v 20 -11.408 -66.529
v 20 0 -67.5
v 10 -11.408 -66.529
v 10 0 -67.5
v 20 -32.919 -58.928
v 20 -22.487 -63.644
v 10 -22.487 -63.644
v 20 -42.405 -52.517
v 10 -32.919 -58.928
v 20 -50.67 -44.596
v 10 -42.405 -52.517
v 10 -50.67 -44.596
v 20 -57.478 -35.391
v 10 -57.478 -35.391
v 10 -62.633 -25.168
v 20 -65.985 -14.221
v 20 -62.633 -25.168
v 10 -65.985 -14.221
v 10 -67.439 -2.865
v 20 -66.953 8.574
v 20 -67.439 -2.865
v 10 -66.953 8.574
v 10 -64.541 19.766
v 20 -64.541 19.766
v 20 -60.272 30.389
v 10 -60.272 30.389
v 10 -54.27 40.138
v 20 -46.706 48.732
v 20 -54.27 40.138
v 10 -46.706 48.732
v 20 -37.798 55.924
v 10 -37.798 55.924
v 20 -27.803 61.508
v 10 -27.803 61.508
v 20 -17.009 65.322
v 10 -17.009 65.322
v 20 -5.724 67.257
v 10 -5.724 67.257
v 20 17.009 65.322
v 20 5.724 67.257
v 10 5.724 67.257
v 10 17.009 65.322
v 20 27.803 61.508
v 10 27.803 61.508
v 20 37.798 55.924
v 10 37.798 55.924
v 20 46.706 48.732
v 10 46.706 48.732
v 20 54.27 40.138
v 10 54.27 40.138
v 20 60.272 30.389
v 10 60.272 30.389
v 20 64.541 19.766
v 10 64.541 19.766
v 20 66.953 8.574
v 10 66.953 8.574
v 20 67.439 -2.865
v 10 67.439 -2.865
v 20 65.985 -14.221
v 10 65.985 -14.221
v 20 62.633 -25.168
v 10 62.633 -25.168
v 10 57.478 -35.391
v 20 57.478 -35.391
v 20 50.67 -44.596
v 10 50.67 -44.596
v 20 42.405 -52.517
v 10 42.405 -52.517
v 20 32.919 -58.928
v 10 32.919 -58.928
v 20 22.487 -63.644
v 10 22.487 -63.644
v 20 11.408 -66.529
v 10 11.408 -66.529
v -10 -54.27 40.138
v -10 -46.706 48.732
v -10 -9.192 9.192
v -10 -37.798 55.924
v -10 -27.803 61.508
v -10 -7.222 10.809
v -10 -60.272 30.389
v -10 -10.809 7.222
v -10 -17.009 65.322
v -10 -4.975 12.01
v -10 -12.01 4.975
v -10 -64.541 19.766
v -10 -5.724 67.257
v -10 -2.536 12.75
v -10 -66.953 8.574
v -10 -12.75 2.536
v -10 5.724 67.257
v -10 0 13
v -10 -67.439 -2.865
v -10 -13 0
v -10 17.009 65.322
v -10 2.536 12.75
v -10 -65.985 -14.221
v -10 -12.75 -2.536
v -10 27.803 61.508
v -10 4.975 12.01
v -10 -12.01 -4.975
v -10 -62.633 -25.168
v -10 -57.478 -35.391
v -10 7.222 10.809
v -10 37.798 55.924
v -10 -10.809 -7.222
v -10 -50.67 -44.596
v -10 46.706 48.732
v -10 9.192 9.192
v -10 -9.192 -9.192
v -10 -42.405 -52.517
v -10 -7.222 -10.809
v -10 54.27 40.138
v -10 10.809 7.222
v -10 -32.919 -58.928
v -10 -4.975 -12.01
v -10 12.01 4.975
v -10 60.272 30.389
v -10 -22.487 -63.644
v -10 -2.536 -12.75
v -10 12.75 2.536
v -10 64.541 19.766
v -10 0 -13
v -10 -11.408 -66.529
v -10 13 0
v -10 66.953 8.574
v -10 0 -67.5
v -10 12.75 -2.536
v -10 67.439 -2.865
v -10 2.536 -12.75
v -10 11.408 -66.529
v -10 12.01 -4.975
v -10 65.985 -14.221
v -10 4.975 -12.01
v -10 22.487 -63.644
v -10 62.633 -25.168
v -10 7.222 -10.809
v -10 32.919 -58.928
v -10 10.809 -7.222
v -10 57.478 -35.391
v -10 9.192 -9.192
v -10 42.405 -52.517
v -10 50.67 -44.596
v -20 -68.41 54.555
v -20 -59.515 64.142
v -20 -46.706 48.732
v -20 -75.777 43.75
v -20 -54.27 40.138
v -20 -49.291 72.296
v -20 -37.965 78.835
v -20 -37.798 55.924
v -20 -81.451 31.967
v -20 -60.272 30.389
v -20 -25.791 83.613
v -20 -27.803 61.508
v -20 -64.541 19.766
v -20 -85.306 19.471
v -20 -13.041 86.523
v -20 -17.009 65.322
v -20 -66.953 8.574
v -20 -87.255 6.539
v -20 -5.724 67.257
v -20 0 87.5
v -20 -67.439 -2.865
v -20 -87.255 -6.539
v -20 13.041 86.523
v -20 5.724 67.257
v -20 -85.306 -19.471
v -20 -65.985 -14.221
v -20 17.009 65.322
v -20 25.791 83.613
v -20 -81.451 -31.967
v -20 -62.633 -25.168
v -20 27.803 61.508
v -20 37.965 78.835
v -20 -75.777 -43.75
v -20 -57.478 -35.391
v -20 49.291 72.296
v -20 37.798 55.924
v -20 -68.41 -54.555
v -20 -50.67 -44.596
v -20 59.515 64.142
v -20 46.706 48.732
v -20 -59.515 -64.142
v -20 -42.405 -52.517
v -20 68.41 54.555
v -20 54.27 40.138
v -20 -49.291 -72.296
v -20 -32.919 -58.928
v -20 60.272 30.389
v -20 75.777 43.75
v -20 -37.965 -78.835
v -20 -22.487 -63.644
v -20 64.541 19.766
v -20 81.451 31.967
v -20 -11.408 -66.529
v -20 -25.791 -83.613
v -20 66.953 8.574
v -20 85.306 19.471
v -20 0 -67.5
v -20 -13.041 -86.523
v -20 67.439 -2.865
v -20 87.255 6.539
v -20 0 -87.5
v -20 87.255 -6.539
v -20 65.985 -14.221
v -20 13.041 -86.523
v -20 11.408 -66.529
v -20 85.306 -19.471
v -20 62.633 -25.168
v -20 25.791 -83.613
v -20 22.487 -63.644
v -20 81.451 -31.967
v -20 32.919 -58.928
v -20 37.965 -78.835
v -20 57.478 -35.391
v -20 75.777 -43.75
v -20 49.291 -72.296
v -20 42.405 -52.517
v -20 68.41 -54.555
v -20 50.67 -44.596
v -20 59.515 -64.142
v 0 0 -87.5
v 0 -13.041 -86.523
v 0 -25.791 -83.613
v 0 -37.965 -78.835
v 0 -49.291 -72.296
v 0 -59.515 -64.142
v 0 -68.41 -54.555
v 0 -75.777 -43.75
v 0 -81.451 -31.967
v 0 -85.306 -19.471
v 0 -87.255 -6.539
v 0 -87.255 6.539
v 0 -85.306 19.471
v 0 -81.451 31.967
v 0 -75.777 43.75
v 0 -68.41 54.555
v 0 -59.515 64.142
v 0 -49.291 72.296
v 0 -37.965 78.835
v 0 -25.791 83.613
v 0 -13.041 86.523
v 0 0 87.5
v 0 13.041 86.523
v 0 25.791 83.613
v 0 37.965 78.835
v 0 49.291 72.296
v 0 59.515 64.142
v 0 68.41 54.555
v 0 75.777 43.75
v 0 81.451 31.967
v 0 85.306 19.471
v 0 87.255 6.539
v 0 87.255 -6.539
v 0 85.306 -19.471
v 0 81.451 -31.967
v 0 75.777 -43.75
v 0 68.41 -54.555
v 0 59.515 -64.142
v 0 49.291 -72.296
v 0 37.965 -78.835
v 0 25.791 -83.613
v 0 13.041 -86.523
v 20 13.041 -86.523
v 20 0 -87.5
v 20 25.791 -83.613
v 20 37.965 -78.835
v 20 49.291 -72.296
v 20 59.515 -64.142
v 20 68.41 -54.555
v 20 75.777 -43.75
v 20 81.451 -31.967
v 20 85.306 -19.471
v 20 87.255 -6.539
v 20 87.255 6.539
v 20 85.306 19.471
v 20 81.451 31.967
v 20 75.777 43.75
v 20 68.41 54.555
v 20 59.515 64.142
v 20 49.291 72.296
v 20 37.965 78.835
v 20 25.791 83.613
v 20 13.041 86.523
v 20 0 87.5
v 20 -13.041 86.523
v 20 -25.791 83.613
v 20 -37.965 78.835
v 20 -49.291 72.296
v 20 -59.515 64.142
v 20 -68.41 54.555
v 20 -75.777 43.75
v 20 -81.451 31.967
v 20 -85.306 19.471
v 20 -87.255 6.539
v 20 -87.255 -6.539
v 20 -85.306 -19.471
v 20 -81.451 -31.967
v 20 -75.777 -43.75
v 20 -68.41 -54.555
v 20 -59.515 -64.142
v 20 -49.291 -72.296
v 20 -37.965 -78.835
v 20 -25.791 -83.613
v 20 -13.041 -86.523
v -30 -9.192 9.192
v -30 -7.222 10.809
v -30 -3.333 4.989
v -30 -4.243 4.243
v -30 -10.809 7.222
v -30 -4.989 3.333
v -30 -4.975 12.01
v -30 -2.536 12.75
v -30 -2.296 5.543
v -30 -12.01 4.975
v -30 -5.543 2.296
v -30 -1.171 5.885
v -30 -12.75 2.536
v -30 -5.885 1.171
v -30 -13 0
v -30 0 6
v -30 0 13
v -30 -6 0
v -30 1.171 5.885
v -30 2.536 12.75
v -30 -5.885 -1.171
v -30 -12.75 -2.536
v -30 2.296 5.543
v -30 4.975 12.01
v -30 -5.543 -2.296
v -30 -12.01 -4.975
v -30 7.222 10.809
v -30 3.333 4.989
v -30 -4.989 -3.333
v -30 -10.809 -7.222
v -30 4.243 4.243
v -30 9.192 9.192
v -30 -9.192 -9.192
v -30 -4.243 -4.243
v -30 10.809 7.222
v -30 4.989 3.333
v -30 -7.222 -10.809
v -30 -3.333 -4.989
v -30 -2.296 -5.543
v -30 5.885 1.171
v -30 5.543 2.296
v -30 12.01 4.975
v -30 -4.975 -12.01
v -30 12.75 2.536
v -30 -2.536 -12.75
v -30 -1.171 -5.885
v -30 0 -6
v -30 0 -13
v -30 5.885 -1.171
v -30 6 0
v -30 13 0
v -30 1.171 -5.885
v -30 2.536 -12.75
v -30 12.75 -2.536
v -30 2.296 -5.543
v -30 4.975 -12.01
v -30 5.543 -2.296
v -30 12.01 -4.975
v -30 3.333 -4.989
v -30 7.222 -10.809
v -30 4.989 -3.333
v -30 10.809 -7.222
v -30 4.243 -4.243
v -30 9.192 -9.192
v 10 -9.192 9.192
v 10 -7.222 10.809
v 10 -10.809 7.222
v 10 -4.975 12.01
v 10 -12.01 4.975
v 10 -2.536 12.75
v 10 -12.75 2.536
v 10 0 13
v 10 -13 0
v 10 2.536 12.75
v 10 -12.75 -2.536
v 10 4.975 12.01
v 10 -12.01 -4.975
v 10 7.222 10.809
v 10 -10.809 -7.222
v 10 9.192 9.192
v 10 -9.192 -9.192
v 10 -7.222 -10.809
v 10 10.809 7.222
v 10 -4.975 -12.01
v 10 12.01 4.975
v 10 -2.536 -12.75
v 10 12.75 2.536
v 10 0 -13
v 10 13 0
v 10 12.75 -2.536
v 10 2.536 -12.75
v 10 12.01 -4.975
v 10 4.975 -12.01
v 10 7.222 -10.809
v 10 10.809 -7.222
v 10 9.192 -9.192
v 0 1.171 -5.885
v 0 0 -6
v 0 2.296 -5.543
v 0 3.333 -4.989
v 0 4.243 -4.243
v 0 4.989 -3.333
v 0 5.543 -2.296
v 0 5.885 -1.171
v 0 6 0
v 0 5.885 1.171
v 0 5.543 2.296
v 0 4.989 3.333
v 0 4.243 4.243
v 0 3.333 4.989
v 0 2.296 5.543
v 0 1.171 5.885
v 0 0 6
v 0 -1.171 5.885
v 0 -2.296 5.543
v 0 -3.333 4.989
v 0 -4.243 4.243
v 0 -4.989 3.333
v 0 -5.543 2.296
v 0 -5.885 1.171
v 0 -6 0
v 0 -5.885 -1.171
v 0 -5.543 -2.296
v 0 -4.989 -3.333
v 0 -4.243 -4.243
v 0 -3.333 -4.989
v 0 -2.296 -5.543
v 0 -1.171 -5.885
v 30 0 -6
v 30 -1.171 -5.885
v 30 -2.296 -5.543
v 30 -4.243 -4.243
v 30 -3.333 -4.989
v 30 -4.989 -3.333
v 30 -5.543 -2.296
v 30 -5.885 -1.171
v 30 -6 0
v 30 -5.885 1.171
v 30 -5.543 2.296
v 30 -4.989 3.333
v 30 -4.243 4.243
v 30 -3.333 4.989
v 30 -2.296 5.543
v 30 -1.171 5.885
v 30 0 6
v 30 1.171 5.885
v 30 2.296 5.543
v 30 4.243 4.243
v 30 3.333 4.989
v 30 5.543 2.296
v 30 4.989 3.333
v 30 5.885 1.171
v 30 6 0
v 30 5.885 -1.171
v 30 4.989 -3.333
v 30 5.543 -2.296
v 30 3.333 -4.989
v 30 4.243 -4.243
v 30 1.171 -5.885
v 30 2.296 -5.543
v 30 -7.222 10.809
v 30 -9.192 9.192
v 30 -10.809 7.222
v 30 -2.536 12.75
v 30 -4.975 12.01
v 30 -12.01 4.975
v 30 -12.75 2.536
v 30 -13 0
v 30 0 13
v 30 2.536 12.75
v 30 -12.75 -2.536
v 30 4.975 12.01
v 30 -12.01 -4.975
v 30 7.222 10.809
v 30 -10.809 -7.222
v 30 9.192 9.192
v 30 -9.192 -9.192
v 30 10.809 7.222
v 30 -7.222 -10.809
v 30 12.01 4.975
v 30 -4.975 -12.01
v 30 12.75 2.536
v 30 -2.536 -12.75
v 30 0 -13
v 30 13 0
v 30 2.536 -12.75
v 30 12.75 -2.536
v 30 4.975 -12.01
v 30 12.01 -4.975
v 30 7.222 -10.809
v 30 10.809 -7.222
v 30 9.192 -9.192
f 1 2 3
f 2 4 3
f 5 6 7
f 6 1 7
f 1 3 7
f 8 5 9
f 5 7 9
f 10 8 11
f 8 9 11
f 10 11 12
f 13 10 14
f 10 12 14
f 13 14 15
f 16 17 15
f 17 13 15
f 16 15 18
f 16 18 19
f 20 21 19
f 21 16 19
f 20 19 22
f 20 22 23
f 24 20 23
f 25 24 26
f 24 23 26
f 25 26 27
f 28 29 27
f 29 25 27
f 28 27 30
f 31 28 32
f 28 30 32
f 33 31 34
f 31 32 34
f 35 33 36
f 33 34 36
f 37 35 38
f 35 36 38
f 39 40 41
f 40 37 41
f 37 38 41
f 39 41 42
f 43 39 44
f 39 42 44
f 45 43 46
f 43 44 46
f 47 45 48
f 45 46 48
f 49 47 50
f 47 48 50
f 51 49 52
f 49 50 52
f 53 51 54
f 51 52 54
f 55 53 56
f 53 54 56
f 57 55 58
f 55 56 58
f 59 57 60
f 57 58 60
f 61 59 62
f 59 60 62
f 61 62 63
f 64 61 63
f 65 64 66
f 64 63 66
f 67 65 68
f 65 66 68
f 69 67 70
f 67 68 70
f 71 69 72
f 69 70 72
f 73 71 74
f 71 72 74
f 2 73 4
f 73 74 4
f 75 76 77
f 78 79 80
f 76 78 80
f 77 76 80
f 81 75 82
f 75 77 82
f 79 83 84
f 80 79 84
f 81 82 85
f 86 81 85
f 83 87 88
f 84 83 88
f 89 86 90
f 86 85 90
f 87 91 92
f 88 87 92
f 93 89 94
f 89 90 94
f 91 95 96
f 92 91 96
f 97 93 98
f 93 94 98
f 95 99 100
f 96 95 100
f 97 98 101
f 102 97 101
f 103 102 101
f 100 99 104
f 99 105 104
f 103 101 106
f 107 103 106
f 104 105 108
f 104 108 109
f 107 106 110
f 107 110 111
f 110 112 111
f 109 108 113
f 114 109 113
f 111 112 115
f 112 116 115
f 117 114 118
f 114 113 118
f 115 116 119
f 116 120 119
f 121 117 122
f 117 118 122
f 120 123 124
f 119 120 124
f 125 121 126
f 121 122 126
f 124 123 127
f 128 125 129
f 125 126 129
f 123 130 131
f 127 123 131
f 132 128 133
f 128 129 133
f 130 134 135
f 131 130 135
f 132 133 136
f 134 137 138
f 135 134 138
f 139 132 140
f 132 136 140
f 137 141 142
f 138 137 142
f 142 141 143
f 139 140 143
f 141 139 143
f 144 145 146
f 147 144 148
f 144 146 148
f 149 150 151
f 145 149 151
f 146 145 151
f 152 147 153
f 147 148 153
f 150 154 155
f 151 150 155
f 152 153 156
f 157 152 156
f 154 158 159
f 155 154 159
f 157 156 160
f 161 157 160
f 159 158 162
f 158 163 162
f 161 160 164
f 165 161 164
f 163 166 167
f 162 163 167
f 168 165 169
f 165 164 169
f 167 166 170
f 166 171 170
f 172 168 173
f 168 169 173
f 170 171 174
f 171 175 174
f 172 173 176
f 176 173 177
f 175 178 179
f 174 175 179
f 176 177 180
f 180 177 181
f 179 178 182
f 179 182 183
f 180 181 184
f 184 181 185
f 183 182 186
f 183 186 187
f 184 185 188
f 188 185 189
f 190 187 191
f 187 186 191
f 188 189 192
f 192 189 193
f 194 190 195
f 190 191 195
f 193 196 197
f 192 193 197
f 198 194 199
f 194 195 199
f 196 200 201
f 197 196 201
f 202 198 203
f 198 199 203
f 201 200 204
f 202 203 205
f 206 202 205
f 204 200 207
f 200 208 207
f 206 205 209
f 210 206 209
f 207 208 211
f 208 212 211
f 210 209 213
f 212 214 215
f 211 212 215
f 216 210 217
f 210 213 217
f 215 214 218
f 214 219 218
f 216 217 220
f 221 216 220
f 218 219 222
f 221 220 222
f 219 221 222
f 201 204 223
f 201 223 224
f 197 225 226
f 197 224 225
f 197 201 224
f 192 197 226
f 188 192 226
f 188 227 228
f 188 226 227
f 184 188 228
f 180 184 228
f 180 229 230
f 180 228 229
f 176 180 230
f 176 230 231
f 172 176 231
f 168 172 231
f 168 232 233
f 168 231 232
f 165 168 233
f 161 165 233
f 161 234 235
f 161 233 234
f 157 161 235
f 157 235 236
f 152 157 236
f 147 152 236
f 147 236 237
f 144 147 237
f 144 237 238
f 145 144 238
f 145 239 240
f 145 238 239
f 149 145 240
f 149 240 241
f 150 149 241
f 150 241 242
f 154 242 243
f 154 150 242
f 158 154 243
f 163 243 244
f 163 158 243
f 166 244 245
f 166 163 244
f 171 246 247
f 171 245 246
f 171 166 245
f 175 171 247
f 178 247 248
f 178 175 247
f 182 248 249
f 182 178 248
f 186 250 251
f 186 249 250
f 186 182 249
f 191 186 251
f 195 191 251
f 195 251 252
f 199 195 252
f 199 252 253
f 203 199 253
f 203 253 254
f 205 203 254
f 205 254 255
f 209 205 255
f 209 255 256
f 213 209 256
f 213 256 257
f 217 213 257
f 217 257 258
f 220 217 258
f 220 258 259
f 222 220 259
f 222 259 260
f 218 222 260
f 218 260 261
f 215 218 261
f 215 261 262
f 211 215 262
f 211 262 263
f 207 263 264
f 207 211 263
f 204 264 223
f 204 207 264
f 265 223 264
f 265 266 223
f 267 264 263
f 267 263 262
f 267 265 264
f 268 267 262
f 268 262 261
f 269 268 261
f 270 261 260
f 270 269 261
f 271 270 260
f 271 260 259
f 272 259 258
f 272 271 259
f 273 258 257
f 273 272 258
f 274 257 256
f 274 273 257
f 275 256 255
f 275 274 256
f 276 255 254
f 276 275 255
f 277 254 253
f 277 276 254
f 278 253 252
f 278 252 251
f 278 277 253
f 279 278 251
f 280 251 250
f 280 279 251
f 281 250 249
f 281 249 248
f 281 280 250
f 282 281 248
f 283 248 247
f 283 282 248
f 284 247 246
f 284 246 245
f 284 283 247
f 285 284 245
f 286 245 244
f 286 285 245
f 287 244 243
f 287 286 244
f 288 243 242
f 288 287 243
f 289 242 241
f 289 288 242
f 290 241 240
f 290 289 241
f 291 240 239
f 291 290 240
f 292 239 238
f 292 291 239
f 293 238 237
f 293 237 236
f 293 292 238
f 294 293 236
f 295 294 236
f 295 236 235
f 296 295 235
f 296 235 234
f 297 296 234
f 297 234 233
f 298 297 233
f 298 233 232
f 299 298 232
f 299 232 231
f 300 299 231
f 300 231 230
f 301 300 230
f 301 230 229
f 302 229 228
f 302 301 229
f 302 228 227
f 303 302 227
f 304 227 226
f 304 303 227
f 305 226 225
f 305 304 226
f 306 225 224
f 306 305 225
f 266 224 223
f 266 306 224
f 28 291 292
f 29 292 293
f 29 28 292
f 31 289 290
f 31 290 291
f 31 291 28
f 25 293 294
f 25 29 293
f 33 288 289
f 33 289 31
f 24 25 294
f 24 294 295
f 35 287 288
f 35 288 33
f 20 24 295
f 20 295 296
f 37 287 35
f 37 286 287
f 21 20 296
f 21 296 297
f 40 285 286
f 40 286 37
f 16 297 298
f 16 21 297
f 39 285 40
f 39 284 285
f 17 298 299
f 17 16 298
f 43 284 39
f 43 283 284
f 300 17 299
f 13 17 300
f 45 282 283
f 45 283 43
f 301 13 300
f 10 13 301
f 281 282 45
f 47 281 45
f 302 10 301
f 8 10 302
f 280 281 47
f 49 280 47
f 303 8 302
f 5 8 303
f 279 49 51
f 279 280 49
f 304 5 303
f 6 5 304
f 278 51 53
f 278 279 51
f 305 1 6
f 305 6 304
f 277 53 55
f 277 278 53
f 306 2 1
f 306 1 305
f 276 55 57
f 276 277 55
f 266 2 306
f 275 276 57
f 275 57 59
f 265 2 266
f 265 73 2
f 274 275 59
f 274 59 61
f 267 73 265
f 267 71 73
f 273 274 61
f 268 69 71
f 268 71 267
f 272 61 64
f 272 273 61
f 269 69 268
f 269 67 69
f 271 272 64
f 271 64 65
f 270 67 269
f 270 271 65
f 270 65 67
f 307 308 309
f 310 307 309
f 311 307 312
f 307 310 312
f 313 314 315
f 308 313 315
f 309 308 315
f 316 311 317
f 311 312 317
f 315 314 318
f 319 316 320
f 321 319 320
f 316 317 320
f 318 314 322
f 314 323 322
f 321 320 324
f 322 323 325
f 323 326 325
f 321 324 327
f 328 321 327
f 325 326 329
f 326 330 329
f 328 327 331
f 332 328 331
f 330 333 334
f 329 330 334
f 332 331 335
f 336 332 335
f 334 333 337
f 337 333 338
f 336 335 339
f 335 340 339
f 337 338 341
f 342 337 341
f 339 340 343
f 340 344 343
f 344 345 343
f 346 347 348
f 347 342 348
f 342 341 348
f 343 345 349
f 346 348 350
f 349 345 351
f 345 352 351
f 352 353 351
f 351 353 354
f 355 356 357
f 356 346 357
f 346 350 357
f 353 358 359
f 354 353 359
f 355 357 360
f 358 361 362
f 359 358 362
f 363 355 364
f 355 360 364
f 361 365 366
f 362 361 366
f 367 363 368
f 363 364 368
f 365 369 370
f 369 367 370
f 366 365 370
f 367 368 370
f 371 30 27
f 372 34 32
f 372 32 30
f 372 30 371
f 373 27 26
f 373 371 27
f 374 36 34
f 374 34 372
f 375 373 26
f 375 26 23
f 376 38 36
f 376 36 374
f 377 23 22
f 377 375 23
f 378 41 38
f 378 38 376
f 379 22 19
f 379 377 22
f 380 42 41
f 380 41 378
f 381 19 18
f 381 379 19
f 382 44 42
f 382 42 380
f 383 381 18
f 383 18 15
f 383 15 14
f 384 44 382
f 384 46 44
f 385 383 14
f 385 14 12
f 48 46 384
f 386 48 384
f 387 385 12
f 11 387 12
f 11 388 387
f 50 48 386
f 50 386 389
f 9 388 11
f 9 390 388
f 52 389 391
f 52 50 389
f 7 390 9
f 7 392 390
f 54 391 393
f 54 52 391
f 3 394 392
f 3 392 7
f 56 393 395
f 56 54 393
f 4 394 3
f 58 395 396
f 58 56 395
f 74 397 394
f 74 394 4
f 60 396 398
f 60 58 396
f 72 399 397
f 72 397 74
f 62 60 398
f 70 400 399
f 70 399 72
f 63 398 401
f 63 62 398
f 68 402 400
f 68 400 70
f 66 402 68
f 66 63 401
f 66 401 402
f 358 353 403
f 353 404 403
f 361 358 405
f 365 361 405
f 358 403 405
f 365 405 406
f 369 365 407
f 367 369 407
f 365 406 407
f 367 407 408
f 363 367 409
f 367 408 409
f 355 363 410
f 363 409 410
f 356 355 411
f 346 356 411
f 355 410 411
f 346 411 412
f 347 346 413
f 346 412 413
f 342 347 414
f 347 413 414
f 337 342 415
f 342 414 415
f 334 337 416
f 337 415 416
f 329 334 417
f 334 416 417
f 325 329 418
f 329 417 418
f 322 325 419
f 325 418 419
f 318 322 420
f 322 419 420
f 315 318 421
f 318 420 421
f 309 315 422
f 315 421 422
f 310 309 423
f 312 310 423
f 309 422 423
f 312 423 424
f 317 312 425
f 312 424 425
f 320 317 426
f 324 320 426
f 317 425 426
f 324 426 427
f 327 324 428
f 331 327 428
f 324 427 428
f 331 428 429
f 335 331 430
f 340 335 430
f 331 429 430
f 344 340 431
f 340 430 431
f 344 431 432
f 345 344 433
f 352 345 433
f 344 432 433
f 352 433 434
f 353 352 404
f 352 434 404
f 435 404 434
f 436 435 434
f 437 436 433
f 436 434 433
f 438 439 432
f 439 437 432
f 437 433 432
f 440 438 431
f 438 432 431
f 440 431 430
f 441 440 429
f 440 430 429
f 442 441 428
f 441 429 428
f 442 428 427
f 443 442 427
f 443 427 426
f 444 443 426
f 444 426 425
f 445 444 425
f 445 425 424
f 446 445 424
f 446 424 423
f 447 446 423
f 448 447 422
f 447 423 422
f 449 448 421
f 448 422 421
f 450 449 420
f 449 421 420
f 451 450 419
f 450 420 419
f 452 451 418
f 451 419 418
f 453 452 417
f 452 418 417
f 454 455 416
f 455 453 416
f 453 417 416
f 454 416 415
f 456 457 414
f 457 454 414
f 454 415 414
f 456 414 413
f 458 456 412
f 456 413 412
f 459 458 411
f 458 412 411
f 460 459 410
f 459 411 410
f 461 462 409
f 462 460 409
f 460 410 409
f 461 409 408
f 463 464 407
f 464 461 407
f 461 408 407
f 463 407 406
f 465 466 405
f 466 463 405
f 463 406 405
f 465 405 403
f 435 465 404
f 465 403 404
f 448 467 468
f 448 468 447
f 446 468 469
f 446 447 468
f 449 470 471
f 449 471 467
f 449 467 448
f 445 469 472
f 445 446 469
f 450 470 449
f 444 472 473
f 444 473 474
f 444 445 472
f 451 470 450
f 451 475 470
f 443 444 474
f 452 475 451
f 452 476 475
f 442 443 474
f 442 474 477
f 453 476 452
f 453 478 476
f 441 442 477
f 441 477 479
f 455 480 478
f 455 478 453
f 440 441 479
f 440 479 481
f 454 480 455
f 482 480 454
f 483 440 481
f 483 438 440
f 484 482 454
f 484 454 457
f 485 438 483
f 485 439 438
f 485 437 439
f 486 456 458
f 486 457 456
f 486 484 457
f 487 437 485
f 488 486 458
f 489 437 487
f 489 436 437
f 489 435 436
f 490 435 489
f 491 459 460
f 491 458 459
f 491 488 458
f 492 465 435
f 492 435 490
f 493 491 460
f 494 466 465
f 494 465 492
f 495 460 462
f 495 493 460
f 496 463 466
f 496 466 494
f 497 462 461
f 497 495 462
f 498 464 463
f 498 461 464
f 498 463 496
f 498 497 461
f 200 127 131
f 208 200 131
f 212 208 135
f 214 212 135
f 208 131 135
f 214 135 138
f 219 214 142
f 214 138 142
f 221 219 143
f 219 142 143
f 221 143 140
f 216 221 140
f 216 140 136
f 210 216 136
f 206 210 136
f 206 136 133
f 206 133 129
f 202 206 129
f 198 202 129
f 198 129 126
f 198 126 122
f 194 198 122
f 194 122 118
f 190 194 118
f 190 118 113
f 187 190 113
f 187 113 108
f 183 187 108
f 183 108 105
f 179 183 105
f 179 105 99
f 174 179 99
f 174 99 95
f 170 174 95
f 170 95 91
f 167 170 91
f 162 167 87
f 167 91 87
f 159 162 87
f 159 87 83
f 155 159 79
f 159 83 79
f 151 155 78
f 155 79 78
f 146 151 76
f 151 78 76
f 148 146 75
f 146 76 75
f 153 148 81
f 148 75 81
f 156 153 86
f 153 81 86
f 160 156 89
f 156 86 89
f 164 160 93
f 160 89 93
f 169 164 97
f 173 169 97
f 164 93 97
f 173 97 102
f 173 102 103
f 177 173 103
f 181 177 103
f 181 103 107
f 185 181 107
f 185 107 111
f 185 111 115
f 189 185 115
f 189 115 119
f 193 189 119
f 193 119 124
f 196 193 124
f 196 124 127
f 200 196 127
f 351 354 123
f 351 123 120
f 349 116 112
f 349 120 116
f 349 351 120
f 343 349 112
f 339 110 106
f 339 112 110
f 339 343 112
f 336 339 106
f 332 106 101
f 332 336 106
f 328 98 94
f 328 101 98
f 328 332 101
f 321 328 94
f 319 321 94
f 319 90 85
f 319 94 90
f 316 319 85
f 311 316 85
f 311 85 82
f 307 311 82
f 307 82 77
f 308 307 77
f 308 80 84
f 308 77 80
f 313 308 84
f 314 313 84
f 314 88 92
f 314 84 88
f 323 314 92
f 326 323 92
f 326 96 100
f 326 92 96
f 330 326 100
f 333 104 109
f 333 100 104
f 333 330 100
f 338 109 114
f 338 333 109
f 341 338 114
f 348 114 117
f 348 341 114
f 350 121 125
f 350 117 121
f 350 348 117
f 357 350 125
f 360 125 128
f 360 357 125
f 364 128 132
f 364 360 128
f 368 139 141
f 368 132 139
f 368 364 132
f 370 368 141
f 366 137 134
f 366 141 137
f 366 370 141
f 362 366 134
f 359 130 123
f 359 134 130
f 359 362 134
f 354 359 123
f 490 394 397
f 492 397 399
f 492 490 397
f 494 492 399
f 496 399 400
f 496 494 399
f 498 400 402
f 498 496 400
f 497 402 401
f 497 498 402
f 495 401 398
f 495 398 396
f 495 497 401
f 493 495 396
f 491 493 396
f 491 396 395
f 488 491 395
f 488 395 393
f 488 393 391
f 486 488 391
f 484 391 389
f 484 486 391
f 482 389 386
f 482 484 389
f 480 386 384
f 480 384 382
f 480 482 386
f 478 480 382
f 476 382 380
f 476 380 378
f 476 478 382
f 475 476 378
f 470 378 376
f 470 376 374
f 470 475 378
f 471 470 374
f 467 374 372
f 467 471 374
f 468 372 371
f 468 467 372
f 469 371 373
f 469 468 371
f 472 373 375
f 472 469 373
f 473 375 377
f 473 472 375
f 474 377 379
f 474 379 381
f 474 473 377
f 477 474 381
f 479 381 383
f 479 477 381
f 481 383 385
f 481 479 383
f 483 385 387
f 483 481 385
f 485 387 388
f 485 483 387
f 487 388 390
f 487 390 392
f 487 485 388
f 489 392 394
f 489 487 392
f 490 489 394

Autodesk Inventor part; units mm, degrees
ref_plane "YZ Plane" through (0, 0, 0) normal (1, 0, 0) x (0, 1, 0)
ref_plane "XZ Plane" through (0, 0, 0) normal (0, 1, 0) x (-1, 0, 0)
ref_plane "XY Plane" through (0, 0, 0) normal (0, 0, 1) x (1, 0, 0)
sketch "Sketch1" plane through (0, 0, 0) normal (0, 1, 0) x (-1, 0, 0)
  line L0 (0, 0) -> (30, 0) construction
  line L1 (30, 0) -> (30, -6) construction
  line L2 (30, -6) -> (30, -13)
  line L3 (0, -87.5) -> (20, -87.5)
  line L4 (20, -87.5) -> (20, -67.5)
  line L5 (30, -6) -> (0, -6)
  line L6 (0, 0) -> (0, -87.5) construction
  line L7 (0, 0) -> (-30, 0) construction
  line L8 (-30, 0) -> (-30, -6) construction
  line L9 (-30, -6) -> (-30, -13)
  line L10 (0, -87.5) -> (-20, -87.5)
  line L11 (-20, -87.5) -> (-20, -67.5)
  line L12 (-30, -6) -> (0, -6)
  line L13 (20, -67.5) -> (10, -67.5)
  line L14 (10, -67.5) -> (10, -13)
  line L15 (10, -13) -> (30, -13)
  line L16 (-10, -67.5) -> (-10, -13)
  line L17 (-10, -13) -> (-30, -13)
  line L18 (-20, -67.5) -> (-10, -67.5)
  dimension "d0" = 30
  dimension "d1" = 6
  dimension "d3" = 7
  dimension "d4" = 20
  dimension "d5" = 87.5
  dimension "d6" = 20
  dimension "d8" = 10
revolve "Revolution1" add sketch "Sketch1" angle 360 about axis through (0, 0, 0) along (1, 0, 0)
properties part number "PK"
